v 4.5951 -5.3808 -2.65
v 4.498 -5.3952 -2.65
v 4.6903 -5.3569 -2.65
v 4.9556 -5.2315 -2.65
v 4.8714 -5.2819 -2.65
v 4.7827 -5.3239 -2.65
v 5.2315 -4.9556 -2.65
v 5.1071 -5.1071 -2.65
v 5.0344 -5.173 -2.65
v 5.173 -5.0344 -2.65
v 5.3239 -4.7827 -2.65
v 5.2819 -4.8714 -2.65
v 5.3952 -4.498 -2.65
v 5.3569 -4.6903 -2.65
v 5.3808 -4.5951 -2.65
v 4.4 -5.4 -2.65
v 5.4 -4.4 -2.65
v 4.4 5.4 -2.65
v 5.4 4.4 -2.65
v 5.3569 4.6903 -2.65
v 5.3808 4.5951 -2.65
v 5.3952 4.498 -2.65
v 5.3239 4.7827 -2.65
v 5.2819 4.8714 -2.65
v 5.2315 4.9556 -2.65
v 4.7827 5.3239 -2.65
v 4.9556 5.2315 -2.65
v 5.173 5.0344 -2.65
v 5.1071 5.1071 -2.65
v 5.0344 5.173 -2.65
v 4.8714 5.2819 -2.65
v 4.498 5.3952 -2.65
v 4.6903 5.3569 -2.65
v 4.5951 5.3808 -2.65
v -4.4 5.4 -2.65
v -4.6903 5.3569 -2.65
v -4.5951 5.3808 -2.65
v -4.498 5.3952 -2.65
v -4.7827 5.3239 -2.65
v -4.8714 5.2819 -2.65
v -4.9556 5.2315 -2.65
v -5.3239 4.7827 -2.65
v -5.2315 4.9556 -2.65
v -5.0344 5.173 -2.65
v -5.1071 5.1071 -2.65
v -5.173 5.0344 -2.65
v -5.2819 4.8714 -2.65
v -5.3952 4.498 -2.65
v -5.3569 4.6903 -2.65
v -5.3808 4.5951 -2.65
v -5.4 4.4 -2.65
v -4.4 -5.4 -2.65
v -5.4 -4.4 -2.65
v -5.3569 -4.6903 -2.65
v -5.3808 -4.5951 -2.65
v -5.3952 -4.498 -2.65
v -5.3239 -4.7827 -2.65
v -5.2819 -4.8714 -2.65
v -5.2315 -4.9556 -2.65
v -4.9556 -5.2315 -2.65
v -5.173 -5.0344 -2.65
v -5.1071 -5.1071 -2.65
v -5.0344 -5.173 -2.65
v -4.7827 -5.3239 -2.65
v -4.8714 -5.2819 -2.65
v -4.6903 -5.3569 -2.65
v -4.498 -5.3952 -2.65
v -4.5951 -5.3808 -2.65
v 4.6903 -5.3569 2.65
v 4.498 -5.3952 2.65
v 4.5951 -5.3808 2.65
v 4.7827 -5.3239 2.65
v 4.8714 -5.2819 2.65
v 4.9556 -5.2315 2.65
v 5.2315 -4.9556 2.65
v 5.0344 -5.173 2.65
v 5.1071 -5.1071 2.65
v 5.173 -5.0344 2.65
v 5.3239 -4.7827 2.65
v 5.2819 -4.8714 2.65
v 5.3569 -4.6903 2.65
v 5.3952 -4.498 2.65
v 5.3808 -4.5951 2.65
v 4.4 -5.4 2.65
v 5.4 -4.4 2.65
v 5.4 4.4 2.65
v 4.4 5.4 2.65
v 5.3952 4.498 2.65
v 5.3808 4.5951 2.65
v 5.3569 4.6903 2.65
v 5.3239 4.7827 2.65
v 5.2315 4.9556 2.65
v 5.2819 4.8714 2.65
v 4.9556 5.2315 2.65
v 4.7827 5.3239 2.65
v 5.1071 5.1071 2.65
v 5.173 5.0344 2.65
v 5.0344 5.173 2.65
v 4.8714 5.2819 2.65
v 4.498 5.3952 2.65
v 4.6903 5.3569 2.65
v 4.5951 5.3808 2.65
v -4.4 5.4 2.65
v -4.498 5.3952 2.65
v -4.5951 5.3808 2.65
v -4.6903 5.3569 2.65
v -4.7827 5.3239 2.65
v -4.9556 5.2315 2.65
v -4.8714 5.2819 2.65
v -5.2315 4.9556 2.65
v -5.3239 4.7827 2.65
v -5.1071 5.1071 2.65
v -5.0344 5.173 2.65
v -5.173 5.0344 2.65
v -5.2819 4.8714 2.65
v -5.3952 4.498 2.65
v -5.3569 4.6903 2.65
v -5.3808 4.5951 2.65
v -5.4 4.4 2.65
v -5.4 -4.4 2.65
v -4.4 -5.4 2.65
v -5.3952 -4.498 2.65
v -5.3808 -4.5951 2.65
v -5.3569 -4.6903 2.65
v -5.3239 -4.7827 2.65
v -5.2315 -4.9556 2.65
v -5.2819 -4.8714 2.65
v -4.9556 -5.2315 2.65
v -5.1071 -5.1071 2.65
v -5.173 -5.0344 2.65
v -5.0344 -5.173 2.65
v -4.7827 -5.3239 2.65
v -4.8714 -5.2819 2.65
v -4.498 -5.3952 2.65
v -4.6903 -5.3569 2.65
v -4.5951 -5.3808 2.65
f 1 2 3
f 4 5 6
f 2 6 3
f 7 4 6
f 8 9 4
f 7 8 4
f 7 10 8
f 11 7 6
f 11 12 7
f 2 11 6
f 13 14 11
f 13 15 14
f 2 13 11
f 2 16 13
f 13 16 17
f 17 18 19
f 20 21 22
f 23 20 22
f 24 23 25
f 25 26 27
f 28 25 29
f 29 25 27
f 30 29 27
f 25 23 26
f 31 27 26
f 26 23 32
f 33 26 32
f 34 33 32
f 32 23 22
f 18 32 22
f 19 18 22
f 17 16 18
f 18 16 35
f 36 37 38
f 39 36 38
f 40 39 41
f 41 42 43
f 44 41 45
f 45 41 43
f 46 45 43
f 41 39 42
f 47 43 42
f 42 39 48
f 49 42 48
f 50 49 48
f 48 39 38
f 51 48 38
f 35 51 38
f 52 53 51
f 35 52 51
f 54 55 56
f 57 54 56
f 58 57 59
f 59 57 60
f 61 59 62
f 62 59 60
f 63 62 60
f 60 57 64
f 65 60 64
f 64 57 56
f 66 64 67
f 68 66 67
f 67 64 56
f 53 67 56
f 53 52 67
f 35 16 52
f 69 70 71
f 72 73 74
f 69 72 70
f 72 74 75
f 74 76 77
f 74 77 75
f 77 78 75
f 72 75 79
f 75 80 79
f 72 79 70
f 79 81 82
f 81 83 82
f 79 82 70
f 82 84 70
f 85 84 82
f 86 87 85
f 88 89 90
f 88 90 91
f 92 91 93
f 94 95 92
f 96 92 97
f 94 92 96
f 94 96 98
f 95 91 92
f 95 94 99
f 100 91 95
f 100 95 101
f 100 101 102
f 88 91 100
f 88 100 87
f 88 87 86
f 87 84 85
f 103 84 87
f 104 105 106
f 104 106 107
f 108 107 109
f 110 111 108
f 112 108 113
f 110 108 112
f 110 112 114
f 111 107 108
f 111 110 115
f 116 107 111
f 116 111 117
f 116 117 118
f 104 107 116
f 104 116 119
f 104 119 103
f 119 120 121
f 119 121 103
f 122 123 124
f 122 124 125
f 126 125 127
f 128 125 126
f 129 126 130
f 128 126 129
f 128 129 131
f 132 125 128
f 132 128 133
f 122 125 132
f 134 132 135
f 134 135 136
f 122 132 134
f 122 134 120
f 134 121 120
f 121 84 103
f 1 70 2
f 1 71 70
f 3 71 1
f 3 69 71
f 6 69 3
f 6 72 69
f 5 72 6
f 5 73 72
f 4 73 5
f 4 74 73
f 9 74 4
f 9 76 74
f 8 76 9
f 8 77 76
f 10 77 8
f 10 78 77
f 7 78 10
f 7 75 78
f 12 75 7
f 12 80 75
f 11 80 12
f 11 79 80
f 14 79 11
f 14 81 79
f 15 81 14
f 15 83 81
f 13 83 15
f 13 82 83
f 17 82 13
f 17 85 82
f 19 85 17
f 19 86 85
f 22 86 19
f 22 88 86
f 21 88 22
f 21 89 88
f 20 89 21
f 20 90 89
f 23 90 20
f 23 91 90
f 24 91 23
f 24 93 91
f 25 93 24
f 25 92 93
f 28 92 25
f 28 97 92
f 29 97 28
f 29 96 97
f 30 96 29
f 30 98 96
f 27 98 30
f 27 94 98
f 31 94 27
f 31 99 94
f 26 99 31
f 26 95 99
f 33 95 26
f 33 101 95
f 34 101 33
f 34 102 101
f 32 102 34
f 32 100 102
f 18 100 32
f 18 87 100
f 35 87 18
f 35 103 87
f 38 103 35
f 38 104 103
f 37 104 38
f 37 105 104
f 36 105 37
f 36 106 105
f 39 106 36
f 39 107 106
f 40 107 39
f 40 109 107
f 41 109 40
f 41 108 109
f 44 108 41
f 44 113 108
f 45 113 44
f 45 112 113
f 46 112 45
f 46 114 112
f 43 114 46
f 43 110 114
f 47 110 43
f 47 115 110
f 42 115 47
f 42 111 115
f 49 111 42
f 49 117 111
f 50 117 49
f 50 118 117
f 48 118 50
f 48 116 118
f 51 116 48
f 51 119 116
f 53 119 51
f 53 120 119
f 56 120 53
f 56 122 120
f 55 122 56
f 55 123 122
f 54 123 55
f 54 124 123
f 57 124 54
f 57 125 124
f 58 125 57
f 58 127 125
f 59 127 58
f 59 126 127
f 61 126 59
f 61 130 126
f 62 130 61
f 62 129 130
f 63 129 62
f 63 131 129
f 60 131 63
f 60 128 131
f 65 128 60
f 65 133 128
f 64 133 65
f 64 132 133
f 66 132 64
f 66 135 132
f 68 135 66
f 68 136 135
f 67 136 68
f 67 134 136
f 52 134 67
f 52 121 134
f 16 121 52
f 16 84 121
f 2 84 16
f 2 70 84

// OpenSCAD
$fn=64;

module radial(size=[10.8,10.8,5.3,1]) {
    w = size[0];
    d = size[1];
    h = size[2];
    r = size[3];
    r2 = min(r, w/2, d/2);

    linear_extrude(height=h, center=true)
        offset(r=r2)
            square([w-2*r2, d-2*r2], center=true);
}

radial([10.8, 10.8, 5.3, 1]);
